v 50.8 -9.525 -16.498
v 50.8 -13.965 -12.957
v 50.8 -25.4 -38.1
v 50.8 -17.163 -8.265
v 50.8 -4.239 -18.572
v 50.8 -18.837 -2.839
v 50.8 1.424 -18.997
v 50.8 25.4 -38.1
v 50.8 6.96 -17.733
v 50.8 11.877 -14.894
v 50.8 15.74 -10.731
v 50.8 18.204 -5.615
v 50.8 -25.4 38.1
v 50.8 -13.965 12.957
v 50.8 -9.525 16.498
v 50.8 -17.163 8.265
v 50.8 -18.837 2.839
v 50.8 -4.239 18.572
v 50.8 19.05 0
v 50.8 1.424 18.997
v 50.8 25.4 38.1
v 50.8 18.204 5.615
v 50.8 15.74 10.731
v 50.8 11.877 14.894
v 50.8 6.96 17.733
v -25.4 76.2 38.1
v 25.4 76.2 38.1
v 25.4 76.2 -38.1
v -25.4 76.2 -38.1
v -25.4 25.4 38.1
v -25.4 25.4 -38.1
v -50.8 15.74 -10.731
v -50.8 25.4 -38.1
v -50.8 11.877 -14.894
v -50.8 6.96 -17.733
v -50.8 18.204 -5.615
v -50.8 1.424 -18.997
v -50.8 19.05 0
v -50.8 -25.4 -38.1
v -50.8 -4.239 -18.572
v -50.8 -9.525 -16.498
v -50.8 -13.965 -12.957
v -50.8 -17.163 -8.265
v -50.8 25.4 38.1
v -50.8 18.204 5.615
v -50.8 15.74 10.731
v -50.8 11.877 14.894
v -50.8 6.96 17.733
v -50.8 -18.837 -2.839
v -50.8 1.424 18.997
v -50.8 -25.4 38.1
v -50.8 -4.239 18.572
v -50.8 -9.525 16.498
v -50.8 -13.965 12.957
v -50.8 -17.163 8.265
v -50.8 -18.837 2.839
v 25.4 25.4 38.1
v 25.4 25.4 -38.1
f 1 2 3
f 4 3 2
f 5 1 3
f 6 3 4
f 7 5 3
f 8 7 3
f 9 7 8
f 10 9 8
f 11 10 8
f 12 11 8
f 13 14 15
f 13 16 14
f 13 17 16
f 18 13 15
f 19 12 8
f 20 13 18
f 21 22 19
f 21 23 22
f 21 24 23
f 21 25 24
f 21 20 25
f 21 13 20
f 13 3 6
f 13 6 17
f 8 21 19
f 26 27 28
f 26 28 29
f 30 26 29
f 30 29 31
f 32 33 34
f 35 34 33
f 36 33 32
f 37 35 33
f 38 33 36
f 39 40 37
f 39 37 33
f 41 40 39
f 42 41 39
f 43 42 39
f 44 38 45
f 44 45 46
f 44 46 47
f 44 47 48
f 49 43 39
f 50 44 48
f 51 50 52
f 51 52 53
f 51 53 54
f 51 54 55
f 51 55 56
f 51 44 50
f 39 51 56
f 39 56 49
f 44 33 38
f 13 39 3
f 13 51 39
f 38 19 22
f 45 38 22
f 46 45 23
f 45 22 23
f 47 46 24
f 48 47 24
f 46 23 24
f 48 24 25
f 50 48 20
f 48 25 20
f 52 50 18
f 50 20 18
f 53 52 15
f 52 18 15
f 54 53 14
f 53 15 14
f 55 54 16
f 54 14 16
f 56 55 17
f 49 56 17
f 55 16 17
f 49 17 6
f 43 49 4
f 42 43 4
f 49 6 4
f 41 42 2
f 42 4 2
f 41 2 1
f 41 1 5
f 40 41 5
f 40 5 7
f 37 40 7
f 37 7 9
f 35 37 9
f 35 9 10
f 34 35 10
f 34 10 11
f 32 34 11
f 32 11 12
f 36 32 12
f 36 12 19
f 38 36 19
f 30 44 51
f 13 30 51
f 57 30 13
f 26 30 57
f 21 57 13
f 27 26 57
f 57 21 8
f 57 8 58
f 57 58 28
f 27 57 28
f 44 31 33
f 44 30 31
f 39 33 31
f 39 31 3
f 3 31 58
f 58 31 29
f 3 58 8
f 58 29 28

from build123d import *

# Parameters (mm, degrees)
F1_DEPTH = 38.1
F2_R     = 19.05
F3_DEPTH = 101.601


with BuildPart() as f1:
    # F0 (on Top) → F1 (new body, symmetric)
    with BuildSketch(Plane.XY):
        Polygon((-50.8, -25.4), (50.8, -25.4), (50.8, 25.4), (25.4, 25.4), (0, 25.4), (-25.4, 25.4), (-50.8, 25.4), align=None)
        Polygon((0, 25.4), (25.4, 25.4), (25.4, 76.2), (-25.4, 76.2), (-25.4, 25.4), align=None)
    extrude(amount=F1_DEPTH, both=True)

    # F2 (on face) → F3 (cut, through all)
    with BuildSketch(Plane.YZ.offset(50.8)):
        Circle(F2_R)
    extrude(amount=-F3_DEPTH, mode=Mode.SUBTRACT)


solid = f1.part
